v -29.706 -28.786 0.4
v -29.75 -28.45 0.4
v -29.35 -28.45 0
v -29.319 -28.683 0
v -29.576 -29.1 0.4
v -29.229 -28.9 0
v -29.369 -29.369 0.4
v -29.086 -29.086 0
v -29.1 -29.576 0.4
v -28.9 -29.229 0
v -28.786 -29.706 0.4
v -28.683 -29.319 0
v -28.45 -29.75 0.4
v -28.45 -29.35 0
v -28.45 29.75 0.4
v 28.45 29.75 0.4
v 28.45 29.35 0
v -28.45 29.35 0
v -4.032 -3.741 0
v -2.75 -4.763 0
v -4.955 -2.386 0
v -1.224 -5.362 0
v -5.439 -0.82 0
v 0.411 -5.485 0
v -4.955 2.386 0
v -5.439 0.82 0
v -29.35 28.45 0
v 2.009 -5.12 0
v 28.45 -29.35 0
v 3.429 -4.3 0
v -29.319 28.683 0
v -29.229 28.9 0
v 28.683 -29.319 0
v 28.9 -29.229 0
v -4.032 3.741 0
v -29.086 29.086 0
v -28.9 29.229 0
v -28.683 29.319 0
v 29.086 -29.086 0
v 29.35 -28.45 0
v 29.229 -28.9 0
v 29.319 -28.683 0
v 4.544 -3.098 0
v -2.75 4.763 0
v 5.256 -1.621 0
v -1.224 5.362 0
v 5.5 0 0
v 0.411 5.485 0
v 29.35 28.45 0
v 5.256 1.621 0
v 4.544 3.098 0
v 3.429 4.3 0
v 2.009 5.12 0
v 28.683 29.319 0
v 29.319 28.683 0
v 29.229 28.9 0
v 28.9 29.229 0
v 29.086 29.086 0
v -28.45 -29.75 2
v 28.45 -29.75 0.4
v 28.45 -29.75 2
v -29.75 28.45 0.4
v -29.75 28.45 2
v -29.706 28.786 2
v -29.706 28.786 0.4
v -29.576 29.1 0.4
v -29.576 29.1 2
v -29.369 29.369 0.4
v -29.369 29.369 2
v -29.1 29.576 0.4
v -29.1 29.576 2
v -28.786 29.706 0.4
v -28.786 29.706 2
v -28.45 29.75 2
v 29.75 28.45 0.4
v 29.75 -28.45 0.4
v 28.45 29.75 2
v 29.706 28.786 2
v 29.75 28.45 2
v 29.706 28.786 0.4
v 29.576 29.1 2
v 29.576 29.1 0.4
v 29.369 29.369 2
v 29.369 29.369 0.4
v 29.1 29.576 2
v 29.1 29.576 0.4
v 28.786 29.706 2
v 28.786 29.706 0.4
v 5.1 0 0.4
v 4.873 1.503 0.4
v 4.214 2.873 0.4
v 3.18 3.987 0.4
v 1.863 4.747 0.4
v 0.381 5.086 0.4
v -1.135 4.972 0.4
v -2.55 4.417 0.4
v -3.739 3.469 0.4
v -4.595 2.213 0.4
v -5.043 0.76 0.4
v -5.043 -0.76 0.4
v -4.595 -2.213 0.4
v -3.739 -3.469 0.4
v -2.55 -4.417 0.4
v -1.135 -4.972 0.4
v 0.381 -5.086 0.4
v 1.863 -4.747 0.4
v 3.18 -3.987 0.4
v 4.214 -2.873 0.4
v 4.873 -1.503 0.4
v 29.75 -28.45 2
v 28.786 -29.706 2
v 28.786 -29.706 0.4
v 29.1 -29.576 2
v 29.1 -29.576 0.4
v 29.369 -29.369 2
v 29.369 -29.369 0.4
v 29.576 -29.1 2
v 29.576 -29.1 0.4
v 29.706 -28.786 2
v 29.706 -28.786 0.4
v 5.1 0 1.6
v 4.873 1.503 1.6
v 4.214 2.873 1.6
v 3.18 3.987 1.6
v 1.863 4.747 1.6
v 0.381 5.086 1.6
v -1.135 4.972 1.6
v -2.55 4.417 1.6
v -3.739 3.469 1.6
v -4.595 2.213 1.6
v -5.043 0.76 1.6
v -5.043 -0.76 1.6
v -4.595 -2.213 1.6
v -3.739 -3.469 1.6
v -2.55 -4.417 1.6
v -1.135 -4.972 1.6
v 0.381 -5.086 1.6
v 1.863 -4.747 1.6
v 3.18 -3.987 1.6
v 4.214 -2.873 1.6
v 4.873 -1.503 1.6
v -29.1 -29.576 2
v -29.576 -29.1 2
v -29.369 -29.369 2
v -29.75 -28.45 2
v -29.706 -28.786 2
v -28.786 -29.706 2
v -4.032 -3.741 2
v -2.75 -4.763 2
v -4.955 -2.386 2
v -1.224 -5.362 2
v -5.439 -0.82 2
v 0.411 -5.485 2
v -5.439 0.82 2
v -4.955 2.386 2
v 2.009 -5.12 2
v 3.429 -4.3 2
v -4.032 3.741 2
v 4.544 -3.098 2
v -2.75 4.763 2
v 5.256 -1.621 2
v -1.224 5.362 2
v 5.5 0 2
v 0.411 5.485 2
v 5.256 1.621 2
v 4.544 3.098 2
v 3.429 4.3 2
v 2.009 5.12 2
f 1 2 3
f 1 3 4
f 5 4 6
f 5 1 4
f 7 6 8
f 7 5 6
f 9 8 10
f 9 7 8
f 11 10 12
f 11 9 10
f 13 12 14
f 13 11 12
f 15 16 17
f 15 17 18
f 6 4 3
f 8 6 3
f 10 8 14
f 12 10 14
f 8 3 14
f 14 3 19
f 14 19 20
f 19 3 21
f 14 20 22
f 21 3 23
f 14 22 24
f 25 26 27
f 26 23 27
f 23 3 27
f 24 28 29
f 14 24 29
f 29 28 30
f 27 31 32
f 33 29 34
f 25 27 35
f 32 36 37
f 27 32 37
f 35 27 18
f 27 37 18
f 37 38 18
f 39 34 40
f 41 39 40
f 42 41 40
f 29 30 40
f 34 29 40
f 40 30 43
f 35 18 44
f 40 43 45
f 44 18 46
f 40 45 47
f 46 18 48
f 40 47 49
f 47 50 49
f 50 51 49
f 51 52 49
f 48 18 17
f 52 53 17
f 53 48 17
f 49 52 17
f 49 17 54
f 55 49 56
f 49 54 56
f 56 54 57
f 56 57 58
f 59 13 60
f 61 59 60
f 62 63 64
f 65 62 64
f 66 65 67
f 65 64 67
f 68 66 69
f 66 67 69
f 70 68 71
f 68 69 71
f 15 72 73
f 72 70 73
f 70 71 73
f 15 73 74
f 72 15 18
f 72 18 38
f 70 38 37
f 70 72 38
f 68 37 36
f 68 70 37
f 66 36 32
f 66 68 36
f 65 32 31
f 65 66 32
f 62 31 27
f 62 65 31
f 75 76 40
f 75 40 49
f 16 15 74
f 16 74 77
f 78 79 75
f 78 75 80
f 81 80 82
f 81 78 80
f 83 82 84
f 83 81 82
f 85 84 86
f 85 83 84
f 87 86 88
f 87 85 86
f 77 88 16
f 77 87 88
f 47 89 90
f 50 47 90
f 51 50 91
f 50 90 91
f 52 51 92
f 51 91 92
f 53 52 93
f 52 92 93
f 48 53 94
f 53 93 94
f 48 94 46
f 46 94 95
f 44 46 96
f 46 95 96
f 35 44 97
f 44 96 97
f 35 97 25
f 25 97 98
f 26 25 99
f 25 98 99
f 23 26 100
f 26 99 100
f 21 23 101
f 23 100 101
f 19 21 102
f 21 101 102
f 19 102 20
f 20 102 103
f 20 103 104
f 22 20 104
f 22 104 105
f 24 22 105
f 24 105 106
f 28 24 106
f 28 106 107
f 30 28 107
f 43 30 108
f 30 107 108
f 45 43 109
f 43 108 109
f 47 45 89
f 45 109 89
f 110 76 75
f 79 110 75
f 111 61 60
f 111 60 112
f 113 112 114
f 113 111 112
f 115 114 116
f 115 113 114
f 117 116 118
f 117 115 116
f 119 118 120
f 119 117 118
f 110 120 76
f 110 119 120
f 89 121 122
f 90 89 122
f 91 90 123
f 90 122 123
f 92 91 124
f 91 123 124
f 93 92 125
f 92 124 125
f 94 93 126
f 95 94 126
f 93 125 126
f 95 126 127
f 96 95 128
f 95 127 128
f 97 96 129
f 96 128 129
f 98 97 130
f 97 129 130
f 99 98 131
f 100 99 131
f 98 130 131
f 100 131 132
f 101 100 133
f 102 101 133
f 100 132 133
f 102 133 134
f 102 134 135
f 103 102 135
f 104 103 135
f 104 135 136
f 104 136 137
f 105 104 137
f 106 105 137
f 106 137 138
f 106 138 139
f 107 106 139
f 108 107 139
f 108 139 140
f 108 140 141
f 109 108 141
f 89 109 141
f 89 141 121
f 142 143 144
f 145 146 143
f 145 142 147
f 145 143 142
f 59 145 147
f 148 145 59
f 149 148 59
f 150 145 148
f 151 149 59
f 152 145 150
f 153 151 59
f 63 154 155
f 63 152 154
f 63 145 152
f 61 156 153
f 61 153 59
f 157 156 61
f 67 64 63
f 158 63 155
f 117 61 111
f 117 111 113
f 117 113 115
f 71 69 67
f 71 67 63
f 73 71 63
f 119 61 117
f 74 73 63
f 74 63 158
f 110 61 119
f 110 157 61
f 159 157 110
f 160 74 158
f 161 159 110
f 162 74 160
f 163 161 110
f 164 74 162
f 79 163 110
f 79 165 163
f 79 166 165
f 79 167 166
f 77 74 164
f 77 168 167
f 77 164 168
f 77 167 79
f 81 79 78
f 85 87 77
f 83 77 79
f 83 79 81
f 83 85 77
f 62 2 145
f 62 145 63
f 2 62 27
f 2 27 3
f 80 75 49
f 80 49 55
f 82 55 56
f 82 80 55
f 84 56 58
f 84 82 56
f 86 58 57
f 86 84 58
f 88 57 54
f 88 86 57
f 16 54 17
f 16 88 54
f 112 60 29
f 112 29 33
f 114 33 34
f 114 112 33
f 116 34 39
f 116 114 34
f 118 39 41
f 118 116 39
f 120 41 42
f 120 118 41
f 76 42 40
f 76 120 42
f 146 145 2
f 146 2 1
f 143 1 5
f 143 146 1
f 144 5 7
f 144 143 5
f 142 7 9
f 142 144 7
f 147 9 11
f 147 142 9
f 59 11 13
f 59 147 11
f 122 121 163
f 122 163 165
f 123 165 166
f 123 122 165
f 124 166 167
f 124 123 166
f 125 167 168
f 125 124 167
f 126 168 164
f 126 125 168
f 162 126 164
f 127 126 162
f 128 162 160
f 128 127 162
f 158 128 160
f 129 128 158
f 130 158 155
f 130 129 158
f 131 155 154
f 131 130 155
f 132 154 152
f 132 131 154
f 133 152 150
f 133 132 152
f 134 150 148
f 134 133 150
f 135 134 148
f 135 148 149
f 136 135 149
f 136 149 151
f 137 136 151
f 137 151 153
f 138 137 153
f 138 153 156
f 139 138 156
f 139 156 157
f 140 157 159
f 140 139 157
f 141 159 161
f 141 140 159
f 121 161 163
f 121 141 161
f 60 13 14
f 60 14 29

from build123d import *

# Parameters (mm, degrees)
F0_W     = 59.5
F0_H     = 59.5
F1_DEPTH = 2
F2_R     = 1.3
F3_R     = 5.1
F4_DEPTH = 25
F5_SIZE  = 0.4


with BuildPart() as f1:
    # F0 (on Top) → F1 (new body)
    with BuildSketch(Plane.XY):
        Rectangle(F0_W, F0_H)
    extrude(amount=F1_DEPTH)

    # F2
    f2_edges = [f1.edges().sort_by_distance(p)[0] for p in [
        (29.75, -29.75, 1),
        (-29.75, -29.75, 1),
        (29.75, 29.75, 1),
        (-29.75, 29.75, 1),
    ]]
    fillet(f2_edges, radius=F2_R)

    # F3 (on face) → F4 (cut)
    with BuildSketch(Plane.XY.offset(2)):
        Circle(F3_R)
    extrude(amount=-F4_DEPTH, mode=Mode.SUBTRACT)

    # F5
    f5_edges = [f1.edges().sort_by_distance(p)[0] for p in [
        (0, -29.75, 0),
        (-5.1, 0, 2),
        (-29.369239, -29.369239, 0),
        (29.369239, -29.369239, 0),
        (-29.75, 0, 0),
        (29.75, 0, 0),
        (-29.369239, 29.369239, 0),
        (29.369239, 29.369239, 0),
        (0, 29.75, 0),
        (-5.1, 0, 0),
    ]]
    chamfer(f5_edges, length=F5_SIZE)


solid = f1.part
